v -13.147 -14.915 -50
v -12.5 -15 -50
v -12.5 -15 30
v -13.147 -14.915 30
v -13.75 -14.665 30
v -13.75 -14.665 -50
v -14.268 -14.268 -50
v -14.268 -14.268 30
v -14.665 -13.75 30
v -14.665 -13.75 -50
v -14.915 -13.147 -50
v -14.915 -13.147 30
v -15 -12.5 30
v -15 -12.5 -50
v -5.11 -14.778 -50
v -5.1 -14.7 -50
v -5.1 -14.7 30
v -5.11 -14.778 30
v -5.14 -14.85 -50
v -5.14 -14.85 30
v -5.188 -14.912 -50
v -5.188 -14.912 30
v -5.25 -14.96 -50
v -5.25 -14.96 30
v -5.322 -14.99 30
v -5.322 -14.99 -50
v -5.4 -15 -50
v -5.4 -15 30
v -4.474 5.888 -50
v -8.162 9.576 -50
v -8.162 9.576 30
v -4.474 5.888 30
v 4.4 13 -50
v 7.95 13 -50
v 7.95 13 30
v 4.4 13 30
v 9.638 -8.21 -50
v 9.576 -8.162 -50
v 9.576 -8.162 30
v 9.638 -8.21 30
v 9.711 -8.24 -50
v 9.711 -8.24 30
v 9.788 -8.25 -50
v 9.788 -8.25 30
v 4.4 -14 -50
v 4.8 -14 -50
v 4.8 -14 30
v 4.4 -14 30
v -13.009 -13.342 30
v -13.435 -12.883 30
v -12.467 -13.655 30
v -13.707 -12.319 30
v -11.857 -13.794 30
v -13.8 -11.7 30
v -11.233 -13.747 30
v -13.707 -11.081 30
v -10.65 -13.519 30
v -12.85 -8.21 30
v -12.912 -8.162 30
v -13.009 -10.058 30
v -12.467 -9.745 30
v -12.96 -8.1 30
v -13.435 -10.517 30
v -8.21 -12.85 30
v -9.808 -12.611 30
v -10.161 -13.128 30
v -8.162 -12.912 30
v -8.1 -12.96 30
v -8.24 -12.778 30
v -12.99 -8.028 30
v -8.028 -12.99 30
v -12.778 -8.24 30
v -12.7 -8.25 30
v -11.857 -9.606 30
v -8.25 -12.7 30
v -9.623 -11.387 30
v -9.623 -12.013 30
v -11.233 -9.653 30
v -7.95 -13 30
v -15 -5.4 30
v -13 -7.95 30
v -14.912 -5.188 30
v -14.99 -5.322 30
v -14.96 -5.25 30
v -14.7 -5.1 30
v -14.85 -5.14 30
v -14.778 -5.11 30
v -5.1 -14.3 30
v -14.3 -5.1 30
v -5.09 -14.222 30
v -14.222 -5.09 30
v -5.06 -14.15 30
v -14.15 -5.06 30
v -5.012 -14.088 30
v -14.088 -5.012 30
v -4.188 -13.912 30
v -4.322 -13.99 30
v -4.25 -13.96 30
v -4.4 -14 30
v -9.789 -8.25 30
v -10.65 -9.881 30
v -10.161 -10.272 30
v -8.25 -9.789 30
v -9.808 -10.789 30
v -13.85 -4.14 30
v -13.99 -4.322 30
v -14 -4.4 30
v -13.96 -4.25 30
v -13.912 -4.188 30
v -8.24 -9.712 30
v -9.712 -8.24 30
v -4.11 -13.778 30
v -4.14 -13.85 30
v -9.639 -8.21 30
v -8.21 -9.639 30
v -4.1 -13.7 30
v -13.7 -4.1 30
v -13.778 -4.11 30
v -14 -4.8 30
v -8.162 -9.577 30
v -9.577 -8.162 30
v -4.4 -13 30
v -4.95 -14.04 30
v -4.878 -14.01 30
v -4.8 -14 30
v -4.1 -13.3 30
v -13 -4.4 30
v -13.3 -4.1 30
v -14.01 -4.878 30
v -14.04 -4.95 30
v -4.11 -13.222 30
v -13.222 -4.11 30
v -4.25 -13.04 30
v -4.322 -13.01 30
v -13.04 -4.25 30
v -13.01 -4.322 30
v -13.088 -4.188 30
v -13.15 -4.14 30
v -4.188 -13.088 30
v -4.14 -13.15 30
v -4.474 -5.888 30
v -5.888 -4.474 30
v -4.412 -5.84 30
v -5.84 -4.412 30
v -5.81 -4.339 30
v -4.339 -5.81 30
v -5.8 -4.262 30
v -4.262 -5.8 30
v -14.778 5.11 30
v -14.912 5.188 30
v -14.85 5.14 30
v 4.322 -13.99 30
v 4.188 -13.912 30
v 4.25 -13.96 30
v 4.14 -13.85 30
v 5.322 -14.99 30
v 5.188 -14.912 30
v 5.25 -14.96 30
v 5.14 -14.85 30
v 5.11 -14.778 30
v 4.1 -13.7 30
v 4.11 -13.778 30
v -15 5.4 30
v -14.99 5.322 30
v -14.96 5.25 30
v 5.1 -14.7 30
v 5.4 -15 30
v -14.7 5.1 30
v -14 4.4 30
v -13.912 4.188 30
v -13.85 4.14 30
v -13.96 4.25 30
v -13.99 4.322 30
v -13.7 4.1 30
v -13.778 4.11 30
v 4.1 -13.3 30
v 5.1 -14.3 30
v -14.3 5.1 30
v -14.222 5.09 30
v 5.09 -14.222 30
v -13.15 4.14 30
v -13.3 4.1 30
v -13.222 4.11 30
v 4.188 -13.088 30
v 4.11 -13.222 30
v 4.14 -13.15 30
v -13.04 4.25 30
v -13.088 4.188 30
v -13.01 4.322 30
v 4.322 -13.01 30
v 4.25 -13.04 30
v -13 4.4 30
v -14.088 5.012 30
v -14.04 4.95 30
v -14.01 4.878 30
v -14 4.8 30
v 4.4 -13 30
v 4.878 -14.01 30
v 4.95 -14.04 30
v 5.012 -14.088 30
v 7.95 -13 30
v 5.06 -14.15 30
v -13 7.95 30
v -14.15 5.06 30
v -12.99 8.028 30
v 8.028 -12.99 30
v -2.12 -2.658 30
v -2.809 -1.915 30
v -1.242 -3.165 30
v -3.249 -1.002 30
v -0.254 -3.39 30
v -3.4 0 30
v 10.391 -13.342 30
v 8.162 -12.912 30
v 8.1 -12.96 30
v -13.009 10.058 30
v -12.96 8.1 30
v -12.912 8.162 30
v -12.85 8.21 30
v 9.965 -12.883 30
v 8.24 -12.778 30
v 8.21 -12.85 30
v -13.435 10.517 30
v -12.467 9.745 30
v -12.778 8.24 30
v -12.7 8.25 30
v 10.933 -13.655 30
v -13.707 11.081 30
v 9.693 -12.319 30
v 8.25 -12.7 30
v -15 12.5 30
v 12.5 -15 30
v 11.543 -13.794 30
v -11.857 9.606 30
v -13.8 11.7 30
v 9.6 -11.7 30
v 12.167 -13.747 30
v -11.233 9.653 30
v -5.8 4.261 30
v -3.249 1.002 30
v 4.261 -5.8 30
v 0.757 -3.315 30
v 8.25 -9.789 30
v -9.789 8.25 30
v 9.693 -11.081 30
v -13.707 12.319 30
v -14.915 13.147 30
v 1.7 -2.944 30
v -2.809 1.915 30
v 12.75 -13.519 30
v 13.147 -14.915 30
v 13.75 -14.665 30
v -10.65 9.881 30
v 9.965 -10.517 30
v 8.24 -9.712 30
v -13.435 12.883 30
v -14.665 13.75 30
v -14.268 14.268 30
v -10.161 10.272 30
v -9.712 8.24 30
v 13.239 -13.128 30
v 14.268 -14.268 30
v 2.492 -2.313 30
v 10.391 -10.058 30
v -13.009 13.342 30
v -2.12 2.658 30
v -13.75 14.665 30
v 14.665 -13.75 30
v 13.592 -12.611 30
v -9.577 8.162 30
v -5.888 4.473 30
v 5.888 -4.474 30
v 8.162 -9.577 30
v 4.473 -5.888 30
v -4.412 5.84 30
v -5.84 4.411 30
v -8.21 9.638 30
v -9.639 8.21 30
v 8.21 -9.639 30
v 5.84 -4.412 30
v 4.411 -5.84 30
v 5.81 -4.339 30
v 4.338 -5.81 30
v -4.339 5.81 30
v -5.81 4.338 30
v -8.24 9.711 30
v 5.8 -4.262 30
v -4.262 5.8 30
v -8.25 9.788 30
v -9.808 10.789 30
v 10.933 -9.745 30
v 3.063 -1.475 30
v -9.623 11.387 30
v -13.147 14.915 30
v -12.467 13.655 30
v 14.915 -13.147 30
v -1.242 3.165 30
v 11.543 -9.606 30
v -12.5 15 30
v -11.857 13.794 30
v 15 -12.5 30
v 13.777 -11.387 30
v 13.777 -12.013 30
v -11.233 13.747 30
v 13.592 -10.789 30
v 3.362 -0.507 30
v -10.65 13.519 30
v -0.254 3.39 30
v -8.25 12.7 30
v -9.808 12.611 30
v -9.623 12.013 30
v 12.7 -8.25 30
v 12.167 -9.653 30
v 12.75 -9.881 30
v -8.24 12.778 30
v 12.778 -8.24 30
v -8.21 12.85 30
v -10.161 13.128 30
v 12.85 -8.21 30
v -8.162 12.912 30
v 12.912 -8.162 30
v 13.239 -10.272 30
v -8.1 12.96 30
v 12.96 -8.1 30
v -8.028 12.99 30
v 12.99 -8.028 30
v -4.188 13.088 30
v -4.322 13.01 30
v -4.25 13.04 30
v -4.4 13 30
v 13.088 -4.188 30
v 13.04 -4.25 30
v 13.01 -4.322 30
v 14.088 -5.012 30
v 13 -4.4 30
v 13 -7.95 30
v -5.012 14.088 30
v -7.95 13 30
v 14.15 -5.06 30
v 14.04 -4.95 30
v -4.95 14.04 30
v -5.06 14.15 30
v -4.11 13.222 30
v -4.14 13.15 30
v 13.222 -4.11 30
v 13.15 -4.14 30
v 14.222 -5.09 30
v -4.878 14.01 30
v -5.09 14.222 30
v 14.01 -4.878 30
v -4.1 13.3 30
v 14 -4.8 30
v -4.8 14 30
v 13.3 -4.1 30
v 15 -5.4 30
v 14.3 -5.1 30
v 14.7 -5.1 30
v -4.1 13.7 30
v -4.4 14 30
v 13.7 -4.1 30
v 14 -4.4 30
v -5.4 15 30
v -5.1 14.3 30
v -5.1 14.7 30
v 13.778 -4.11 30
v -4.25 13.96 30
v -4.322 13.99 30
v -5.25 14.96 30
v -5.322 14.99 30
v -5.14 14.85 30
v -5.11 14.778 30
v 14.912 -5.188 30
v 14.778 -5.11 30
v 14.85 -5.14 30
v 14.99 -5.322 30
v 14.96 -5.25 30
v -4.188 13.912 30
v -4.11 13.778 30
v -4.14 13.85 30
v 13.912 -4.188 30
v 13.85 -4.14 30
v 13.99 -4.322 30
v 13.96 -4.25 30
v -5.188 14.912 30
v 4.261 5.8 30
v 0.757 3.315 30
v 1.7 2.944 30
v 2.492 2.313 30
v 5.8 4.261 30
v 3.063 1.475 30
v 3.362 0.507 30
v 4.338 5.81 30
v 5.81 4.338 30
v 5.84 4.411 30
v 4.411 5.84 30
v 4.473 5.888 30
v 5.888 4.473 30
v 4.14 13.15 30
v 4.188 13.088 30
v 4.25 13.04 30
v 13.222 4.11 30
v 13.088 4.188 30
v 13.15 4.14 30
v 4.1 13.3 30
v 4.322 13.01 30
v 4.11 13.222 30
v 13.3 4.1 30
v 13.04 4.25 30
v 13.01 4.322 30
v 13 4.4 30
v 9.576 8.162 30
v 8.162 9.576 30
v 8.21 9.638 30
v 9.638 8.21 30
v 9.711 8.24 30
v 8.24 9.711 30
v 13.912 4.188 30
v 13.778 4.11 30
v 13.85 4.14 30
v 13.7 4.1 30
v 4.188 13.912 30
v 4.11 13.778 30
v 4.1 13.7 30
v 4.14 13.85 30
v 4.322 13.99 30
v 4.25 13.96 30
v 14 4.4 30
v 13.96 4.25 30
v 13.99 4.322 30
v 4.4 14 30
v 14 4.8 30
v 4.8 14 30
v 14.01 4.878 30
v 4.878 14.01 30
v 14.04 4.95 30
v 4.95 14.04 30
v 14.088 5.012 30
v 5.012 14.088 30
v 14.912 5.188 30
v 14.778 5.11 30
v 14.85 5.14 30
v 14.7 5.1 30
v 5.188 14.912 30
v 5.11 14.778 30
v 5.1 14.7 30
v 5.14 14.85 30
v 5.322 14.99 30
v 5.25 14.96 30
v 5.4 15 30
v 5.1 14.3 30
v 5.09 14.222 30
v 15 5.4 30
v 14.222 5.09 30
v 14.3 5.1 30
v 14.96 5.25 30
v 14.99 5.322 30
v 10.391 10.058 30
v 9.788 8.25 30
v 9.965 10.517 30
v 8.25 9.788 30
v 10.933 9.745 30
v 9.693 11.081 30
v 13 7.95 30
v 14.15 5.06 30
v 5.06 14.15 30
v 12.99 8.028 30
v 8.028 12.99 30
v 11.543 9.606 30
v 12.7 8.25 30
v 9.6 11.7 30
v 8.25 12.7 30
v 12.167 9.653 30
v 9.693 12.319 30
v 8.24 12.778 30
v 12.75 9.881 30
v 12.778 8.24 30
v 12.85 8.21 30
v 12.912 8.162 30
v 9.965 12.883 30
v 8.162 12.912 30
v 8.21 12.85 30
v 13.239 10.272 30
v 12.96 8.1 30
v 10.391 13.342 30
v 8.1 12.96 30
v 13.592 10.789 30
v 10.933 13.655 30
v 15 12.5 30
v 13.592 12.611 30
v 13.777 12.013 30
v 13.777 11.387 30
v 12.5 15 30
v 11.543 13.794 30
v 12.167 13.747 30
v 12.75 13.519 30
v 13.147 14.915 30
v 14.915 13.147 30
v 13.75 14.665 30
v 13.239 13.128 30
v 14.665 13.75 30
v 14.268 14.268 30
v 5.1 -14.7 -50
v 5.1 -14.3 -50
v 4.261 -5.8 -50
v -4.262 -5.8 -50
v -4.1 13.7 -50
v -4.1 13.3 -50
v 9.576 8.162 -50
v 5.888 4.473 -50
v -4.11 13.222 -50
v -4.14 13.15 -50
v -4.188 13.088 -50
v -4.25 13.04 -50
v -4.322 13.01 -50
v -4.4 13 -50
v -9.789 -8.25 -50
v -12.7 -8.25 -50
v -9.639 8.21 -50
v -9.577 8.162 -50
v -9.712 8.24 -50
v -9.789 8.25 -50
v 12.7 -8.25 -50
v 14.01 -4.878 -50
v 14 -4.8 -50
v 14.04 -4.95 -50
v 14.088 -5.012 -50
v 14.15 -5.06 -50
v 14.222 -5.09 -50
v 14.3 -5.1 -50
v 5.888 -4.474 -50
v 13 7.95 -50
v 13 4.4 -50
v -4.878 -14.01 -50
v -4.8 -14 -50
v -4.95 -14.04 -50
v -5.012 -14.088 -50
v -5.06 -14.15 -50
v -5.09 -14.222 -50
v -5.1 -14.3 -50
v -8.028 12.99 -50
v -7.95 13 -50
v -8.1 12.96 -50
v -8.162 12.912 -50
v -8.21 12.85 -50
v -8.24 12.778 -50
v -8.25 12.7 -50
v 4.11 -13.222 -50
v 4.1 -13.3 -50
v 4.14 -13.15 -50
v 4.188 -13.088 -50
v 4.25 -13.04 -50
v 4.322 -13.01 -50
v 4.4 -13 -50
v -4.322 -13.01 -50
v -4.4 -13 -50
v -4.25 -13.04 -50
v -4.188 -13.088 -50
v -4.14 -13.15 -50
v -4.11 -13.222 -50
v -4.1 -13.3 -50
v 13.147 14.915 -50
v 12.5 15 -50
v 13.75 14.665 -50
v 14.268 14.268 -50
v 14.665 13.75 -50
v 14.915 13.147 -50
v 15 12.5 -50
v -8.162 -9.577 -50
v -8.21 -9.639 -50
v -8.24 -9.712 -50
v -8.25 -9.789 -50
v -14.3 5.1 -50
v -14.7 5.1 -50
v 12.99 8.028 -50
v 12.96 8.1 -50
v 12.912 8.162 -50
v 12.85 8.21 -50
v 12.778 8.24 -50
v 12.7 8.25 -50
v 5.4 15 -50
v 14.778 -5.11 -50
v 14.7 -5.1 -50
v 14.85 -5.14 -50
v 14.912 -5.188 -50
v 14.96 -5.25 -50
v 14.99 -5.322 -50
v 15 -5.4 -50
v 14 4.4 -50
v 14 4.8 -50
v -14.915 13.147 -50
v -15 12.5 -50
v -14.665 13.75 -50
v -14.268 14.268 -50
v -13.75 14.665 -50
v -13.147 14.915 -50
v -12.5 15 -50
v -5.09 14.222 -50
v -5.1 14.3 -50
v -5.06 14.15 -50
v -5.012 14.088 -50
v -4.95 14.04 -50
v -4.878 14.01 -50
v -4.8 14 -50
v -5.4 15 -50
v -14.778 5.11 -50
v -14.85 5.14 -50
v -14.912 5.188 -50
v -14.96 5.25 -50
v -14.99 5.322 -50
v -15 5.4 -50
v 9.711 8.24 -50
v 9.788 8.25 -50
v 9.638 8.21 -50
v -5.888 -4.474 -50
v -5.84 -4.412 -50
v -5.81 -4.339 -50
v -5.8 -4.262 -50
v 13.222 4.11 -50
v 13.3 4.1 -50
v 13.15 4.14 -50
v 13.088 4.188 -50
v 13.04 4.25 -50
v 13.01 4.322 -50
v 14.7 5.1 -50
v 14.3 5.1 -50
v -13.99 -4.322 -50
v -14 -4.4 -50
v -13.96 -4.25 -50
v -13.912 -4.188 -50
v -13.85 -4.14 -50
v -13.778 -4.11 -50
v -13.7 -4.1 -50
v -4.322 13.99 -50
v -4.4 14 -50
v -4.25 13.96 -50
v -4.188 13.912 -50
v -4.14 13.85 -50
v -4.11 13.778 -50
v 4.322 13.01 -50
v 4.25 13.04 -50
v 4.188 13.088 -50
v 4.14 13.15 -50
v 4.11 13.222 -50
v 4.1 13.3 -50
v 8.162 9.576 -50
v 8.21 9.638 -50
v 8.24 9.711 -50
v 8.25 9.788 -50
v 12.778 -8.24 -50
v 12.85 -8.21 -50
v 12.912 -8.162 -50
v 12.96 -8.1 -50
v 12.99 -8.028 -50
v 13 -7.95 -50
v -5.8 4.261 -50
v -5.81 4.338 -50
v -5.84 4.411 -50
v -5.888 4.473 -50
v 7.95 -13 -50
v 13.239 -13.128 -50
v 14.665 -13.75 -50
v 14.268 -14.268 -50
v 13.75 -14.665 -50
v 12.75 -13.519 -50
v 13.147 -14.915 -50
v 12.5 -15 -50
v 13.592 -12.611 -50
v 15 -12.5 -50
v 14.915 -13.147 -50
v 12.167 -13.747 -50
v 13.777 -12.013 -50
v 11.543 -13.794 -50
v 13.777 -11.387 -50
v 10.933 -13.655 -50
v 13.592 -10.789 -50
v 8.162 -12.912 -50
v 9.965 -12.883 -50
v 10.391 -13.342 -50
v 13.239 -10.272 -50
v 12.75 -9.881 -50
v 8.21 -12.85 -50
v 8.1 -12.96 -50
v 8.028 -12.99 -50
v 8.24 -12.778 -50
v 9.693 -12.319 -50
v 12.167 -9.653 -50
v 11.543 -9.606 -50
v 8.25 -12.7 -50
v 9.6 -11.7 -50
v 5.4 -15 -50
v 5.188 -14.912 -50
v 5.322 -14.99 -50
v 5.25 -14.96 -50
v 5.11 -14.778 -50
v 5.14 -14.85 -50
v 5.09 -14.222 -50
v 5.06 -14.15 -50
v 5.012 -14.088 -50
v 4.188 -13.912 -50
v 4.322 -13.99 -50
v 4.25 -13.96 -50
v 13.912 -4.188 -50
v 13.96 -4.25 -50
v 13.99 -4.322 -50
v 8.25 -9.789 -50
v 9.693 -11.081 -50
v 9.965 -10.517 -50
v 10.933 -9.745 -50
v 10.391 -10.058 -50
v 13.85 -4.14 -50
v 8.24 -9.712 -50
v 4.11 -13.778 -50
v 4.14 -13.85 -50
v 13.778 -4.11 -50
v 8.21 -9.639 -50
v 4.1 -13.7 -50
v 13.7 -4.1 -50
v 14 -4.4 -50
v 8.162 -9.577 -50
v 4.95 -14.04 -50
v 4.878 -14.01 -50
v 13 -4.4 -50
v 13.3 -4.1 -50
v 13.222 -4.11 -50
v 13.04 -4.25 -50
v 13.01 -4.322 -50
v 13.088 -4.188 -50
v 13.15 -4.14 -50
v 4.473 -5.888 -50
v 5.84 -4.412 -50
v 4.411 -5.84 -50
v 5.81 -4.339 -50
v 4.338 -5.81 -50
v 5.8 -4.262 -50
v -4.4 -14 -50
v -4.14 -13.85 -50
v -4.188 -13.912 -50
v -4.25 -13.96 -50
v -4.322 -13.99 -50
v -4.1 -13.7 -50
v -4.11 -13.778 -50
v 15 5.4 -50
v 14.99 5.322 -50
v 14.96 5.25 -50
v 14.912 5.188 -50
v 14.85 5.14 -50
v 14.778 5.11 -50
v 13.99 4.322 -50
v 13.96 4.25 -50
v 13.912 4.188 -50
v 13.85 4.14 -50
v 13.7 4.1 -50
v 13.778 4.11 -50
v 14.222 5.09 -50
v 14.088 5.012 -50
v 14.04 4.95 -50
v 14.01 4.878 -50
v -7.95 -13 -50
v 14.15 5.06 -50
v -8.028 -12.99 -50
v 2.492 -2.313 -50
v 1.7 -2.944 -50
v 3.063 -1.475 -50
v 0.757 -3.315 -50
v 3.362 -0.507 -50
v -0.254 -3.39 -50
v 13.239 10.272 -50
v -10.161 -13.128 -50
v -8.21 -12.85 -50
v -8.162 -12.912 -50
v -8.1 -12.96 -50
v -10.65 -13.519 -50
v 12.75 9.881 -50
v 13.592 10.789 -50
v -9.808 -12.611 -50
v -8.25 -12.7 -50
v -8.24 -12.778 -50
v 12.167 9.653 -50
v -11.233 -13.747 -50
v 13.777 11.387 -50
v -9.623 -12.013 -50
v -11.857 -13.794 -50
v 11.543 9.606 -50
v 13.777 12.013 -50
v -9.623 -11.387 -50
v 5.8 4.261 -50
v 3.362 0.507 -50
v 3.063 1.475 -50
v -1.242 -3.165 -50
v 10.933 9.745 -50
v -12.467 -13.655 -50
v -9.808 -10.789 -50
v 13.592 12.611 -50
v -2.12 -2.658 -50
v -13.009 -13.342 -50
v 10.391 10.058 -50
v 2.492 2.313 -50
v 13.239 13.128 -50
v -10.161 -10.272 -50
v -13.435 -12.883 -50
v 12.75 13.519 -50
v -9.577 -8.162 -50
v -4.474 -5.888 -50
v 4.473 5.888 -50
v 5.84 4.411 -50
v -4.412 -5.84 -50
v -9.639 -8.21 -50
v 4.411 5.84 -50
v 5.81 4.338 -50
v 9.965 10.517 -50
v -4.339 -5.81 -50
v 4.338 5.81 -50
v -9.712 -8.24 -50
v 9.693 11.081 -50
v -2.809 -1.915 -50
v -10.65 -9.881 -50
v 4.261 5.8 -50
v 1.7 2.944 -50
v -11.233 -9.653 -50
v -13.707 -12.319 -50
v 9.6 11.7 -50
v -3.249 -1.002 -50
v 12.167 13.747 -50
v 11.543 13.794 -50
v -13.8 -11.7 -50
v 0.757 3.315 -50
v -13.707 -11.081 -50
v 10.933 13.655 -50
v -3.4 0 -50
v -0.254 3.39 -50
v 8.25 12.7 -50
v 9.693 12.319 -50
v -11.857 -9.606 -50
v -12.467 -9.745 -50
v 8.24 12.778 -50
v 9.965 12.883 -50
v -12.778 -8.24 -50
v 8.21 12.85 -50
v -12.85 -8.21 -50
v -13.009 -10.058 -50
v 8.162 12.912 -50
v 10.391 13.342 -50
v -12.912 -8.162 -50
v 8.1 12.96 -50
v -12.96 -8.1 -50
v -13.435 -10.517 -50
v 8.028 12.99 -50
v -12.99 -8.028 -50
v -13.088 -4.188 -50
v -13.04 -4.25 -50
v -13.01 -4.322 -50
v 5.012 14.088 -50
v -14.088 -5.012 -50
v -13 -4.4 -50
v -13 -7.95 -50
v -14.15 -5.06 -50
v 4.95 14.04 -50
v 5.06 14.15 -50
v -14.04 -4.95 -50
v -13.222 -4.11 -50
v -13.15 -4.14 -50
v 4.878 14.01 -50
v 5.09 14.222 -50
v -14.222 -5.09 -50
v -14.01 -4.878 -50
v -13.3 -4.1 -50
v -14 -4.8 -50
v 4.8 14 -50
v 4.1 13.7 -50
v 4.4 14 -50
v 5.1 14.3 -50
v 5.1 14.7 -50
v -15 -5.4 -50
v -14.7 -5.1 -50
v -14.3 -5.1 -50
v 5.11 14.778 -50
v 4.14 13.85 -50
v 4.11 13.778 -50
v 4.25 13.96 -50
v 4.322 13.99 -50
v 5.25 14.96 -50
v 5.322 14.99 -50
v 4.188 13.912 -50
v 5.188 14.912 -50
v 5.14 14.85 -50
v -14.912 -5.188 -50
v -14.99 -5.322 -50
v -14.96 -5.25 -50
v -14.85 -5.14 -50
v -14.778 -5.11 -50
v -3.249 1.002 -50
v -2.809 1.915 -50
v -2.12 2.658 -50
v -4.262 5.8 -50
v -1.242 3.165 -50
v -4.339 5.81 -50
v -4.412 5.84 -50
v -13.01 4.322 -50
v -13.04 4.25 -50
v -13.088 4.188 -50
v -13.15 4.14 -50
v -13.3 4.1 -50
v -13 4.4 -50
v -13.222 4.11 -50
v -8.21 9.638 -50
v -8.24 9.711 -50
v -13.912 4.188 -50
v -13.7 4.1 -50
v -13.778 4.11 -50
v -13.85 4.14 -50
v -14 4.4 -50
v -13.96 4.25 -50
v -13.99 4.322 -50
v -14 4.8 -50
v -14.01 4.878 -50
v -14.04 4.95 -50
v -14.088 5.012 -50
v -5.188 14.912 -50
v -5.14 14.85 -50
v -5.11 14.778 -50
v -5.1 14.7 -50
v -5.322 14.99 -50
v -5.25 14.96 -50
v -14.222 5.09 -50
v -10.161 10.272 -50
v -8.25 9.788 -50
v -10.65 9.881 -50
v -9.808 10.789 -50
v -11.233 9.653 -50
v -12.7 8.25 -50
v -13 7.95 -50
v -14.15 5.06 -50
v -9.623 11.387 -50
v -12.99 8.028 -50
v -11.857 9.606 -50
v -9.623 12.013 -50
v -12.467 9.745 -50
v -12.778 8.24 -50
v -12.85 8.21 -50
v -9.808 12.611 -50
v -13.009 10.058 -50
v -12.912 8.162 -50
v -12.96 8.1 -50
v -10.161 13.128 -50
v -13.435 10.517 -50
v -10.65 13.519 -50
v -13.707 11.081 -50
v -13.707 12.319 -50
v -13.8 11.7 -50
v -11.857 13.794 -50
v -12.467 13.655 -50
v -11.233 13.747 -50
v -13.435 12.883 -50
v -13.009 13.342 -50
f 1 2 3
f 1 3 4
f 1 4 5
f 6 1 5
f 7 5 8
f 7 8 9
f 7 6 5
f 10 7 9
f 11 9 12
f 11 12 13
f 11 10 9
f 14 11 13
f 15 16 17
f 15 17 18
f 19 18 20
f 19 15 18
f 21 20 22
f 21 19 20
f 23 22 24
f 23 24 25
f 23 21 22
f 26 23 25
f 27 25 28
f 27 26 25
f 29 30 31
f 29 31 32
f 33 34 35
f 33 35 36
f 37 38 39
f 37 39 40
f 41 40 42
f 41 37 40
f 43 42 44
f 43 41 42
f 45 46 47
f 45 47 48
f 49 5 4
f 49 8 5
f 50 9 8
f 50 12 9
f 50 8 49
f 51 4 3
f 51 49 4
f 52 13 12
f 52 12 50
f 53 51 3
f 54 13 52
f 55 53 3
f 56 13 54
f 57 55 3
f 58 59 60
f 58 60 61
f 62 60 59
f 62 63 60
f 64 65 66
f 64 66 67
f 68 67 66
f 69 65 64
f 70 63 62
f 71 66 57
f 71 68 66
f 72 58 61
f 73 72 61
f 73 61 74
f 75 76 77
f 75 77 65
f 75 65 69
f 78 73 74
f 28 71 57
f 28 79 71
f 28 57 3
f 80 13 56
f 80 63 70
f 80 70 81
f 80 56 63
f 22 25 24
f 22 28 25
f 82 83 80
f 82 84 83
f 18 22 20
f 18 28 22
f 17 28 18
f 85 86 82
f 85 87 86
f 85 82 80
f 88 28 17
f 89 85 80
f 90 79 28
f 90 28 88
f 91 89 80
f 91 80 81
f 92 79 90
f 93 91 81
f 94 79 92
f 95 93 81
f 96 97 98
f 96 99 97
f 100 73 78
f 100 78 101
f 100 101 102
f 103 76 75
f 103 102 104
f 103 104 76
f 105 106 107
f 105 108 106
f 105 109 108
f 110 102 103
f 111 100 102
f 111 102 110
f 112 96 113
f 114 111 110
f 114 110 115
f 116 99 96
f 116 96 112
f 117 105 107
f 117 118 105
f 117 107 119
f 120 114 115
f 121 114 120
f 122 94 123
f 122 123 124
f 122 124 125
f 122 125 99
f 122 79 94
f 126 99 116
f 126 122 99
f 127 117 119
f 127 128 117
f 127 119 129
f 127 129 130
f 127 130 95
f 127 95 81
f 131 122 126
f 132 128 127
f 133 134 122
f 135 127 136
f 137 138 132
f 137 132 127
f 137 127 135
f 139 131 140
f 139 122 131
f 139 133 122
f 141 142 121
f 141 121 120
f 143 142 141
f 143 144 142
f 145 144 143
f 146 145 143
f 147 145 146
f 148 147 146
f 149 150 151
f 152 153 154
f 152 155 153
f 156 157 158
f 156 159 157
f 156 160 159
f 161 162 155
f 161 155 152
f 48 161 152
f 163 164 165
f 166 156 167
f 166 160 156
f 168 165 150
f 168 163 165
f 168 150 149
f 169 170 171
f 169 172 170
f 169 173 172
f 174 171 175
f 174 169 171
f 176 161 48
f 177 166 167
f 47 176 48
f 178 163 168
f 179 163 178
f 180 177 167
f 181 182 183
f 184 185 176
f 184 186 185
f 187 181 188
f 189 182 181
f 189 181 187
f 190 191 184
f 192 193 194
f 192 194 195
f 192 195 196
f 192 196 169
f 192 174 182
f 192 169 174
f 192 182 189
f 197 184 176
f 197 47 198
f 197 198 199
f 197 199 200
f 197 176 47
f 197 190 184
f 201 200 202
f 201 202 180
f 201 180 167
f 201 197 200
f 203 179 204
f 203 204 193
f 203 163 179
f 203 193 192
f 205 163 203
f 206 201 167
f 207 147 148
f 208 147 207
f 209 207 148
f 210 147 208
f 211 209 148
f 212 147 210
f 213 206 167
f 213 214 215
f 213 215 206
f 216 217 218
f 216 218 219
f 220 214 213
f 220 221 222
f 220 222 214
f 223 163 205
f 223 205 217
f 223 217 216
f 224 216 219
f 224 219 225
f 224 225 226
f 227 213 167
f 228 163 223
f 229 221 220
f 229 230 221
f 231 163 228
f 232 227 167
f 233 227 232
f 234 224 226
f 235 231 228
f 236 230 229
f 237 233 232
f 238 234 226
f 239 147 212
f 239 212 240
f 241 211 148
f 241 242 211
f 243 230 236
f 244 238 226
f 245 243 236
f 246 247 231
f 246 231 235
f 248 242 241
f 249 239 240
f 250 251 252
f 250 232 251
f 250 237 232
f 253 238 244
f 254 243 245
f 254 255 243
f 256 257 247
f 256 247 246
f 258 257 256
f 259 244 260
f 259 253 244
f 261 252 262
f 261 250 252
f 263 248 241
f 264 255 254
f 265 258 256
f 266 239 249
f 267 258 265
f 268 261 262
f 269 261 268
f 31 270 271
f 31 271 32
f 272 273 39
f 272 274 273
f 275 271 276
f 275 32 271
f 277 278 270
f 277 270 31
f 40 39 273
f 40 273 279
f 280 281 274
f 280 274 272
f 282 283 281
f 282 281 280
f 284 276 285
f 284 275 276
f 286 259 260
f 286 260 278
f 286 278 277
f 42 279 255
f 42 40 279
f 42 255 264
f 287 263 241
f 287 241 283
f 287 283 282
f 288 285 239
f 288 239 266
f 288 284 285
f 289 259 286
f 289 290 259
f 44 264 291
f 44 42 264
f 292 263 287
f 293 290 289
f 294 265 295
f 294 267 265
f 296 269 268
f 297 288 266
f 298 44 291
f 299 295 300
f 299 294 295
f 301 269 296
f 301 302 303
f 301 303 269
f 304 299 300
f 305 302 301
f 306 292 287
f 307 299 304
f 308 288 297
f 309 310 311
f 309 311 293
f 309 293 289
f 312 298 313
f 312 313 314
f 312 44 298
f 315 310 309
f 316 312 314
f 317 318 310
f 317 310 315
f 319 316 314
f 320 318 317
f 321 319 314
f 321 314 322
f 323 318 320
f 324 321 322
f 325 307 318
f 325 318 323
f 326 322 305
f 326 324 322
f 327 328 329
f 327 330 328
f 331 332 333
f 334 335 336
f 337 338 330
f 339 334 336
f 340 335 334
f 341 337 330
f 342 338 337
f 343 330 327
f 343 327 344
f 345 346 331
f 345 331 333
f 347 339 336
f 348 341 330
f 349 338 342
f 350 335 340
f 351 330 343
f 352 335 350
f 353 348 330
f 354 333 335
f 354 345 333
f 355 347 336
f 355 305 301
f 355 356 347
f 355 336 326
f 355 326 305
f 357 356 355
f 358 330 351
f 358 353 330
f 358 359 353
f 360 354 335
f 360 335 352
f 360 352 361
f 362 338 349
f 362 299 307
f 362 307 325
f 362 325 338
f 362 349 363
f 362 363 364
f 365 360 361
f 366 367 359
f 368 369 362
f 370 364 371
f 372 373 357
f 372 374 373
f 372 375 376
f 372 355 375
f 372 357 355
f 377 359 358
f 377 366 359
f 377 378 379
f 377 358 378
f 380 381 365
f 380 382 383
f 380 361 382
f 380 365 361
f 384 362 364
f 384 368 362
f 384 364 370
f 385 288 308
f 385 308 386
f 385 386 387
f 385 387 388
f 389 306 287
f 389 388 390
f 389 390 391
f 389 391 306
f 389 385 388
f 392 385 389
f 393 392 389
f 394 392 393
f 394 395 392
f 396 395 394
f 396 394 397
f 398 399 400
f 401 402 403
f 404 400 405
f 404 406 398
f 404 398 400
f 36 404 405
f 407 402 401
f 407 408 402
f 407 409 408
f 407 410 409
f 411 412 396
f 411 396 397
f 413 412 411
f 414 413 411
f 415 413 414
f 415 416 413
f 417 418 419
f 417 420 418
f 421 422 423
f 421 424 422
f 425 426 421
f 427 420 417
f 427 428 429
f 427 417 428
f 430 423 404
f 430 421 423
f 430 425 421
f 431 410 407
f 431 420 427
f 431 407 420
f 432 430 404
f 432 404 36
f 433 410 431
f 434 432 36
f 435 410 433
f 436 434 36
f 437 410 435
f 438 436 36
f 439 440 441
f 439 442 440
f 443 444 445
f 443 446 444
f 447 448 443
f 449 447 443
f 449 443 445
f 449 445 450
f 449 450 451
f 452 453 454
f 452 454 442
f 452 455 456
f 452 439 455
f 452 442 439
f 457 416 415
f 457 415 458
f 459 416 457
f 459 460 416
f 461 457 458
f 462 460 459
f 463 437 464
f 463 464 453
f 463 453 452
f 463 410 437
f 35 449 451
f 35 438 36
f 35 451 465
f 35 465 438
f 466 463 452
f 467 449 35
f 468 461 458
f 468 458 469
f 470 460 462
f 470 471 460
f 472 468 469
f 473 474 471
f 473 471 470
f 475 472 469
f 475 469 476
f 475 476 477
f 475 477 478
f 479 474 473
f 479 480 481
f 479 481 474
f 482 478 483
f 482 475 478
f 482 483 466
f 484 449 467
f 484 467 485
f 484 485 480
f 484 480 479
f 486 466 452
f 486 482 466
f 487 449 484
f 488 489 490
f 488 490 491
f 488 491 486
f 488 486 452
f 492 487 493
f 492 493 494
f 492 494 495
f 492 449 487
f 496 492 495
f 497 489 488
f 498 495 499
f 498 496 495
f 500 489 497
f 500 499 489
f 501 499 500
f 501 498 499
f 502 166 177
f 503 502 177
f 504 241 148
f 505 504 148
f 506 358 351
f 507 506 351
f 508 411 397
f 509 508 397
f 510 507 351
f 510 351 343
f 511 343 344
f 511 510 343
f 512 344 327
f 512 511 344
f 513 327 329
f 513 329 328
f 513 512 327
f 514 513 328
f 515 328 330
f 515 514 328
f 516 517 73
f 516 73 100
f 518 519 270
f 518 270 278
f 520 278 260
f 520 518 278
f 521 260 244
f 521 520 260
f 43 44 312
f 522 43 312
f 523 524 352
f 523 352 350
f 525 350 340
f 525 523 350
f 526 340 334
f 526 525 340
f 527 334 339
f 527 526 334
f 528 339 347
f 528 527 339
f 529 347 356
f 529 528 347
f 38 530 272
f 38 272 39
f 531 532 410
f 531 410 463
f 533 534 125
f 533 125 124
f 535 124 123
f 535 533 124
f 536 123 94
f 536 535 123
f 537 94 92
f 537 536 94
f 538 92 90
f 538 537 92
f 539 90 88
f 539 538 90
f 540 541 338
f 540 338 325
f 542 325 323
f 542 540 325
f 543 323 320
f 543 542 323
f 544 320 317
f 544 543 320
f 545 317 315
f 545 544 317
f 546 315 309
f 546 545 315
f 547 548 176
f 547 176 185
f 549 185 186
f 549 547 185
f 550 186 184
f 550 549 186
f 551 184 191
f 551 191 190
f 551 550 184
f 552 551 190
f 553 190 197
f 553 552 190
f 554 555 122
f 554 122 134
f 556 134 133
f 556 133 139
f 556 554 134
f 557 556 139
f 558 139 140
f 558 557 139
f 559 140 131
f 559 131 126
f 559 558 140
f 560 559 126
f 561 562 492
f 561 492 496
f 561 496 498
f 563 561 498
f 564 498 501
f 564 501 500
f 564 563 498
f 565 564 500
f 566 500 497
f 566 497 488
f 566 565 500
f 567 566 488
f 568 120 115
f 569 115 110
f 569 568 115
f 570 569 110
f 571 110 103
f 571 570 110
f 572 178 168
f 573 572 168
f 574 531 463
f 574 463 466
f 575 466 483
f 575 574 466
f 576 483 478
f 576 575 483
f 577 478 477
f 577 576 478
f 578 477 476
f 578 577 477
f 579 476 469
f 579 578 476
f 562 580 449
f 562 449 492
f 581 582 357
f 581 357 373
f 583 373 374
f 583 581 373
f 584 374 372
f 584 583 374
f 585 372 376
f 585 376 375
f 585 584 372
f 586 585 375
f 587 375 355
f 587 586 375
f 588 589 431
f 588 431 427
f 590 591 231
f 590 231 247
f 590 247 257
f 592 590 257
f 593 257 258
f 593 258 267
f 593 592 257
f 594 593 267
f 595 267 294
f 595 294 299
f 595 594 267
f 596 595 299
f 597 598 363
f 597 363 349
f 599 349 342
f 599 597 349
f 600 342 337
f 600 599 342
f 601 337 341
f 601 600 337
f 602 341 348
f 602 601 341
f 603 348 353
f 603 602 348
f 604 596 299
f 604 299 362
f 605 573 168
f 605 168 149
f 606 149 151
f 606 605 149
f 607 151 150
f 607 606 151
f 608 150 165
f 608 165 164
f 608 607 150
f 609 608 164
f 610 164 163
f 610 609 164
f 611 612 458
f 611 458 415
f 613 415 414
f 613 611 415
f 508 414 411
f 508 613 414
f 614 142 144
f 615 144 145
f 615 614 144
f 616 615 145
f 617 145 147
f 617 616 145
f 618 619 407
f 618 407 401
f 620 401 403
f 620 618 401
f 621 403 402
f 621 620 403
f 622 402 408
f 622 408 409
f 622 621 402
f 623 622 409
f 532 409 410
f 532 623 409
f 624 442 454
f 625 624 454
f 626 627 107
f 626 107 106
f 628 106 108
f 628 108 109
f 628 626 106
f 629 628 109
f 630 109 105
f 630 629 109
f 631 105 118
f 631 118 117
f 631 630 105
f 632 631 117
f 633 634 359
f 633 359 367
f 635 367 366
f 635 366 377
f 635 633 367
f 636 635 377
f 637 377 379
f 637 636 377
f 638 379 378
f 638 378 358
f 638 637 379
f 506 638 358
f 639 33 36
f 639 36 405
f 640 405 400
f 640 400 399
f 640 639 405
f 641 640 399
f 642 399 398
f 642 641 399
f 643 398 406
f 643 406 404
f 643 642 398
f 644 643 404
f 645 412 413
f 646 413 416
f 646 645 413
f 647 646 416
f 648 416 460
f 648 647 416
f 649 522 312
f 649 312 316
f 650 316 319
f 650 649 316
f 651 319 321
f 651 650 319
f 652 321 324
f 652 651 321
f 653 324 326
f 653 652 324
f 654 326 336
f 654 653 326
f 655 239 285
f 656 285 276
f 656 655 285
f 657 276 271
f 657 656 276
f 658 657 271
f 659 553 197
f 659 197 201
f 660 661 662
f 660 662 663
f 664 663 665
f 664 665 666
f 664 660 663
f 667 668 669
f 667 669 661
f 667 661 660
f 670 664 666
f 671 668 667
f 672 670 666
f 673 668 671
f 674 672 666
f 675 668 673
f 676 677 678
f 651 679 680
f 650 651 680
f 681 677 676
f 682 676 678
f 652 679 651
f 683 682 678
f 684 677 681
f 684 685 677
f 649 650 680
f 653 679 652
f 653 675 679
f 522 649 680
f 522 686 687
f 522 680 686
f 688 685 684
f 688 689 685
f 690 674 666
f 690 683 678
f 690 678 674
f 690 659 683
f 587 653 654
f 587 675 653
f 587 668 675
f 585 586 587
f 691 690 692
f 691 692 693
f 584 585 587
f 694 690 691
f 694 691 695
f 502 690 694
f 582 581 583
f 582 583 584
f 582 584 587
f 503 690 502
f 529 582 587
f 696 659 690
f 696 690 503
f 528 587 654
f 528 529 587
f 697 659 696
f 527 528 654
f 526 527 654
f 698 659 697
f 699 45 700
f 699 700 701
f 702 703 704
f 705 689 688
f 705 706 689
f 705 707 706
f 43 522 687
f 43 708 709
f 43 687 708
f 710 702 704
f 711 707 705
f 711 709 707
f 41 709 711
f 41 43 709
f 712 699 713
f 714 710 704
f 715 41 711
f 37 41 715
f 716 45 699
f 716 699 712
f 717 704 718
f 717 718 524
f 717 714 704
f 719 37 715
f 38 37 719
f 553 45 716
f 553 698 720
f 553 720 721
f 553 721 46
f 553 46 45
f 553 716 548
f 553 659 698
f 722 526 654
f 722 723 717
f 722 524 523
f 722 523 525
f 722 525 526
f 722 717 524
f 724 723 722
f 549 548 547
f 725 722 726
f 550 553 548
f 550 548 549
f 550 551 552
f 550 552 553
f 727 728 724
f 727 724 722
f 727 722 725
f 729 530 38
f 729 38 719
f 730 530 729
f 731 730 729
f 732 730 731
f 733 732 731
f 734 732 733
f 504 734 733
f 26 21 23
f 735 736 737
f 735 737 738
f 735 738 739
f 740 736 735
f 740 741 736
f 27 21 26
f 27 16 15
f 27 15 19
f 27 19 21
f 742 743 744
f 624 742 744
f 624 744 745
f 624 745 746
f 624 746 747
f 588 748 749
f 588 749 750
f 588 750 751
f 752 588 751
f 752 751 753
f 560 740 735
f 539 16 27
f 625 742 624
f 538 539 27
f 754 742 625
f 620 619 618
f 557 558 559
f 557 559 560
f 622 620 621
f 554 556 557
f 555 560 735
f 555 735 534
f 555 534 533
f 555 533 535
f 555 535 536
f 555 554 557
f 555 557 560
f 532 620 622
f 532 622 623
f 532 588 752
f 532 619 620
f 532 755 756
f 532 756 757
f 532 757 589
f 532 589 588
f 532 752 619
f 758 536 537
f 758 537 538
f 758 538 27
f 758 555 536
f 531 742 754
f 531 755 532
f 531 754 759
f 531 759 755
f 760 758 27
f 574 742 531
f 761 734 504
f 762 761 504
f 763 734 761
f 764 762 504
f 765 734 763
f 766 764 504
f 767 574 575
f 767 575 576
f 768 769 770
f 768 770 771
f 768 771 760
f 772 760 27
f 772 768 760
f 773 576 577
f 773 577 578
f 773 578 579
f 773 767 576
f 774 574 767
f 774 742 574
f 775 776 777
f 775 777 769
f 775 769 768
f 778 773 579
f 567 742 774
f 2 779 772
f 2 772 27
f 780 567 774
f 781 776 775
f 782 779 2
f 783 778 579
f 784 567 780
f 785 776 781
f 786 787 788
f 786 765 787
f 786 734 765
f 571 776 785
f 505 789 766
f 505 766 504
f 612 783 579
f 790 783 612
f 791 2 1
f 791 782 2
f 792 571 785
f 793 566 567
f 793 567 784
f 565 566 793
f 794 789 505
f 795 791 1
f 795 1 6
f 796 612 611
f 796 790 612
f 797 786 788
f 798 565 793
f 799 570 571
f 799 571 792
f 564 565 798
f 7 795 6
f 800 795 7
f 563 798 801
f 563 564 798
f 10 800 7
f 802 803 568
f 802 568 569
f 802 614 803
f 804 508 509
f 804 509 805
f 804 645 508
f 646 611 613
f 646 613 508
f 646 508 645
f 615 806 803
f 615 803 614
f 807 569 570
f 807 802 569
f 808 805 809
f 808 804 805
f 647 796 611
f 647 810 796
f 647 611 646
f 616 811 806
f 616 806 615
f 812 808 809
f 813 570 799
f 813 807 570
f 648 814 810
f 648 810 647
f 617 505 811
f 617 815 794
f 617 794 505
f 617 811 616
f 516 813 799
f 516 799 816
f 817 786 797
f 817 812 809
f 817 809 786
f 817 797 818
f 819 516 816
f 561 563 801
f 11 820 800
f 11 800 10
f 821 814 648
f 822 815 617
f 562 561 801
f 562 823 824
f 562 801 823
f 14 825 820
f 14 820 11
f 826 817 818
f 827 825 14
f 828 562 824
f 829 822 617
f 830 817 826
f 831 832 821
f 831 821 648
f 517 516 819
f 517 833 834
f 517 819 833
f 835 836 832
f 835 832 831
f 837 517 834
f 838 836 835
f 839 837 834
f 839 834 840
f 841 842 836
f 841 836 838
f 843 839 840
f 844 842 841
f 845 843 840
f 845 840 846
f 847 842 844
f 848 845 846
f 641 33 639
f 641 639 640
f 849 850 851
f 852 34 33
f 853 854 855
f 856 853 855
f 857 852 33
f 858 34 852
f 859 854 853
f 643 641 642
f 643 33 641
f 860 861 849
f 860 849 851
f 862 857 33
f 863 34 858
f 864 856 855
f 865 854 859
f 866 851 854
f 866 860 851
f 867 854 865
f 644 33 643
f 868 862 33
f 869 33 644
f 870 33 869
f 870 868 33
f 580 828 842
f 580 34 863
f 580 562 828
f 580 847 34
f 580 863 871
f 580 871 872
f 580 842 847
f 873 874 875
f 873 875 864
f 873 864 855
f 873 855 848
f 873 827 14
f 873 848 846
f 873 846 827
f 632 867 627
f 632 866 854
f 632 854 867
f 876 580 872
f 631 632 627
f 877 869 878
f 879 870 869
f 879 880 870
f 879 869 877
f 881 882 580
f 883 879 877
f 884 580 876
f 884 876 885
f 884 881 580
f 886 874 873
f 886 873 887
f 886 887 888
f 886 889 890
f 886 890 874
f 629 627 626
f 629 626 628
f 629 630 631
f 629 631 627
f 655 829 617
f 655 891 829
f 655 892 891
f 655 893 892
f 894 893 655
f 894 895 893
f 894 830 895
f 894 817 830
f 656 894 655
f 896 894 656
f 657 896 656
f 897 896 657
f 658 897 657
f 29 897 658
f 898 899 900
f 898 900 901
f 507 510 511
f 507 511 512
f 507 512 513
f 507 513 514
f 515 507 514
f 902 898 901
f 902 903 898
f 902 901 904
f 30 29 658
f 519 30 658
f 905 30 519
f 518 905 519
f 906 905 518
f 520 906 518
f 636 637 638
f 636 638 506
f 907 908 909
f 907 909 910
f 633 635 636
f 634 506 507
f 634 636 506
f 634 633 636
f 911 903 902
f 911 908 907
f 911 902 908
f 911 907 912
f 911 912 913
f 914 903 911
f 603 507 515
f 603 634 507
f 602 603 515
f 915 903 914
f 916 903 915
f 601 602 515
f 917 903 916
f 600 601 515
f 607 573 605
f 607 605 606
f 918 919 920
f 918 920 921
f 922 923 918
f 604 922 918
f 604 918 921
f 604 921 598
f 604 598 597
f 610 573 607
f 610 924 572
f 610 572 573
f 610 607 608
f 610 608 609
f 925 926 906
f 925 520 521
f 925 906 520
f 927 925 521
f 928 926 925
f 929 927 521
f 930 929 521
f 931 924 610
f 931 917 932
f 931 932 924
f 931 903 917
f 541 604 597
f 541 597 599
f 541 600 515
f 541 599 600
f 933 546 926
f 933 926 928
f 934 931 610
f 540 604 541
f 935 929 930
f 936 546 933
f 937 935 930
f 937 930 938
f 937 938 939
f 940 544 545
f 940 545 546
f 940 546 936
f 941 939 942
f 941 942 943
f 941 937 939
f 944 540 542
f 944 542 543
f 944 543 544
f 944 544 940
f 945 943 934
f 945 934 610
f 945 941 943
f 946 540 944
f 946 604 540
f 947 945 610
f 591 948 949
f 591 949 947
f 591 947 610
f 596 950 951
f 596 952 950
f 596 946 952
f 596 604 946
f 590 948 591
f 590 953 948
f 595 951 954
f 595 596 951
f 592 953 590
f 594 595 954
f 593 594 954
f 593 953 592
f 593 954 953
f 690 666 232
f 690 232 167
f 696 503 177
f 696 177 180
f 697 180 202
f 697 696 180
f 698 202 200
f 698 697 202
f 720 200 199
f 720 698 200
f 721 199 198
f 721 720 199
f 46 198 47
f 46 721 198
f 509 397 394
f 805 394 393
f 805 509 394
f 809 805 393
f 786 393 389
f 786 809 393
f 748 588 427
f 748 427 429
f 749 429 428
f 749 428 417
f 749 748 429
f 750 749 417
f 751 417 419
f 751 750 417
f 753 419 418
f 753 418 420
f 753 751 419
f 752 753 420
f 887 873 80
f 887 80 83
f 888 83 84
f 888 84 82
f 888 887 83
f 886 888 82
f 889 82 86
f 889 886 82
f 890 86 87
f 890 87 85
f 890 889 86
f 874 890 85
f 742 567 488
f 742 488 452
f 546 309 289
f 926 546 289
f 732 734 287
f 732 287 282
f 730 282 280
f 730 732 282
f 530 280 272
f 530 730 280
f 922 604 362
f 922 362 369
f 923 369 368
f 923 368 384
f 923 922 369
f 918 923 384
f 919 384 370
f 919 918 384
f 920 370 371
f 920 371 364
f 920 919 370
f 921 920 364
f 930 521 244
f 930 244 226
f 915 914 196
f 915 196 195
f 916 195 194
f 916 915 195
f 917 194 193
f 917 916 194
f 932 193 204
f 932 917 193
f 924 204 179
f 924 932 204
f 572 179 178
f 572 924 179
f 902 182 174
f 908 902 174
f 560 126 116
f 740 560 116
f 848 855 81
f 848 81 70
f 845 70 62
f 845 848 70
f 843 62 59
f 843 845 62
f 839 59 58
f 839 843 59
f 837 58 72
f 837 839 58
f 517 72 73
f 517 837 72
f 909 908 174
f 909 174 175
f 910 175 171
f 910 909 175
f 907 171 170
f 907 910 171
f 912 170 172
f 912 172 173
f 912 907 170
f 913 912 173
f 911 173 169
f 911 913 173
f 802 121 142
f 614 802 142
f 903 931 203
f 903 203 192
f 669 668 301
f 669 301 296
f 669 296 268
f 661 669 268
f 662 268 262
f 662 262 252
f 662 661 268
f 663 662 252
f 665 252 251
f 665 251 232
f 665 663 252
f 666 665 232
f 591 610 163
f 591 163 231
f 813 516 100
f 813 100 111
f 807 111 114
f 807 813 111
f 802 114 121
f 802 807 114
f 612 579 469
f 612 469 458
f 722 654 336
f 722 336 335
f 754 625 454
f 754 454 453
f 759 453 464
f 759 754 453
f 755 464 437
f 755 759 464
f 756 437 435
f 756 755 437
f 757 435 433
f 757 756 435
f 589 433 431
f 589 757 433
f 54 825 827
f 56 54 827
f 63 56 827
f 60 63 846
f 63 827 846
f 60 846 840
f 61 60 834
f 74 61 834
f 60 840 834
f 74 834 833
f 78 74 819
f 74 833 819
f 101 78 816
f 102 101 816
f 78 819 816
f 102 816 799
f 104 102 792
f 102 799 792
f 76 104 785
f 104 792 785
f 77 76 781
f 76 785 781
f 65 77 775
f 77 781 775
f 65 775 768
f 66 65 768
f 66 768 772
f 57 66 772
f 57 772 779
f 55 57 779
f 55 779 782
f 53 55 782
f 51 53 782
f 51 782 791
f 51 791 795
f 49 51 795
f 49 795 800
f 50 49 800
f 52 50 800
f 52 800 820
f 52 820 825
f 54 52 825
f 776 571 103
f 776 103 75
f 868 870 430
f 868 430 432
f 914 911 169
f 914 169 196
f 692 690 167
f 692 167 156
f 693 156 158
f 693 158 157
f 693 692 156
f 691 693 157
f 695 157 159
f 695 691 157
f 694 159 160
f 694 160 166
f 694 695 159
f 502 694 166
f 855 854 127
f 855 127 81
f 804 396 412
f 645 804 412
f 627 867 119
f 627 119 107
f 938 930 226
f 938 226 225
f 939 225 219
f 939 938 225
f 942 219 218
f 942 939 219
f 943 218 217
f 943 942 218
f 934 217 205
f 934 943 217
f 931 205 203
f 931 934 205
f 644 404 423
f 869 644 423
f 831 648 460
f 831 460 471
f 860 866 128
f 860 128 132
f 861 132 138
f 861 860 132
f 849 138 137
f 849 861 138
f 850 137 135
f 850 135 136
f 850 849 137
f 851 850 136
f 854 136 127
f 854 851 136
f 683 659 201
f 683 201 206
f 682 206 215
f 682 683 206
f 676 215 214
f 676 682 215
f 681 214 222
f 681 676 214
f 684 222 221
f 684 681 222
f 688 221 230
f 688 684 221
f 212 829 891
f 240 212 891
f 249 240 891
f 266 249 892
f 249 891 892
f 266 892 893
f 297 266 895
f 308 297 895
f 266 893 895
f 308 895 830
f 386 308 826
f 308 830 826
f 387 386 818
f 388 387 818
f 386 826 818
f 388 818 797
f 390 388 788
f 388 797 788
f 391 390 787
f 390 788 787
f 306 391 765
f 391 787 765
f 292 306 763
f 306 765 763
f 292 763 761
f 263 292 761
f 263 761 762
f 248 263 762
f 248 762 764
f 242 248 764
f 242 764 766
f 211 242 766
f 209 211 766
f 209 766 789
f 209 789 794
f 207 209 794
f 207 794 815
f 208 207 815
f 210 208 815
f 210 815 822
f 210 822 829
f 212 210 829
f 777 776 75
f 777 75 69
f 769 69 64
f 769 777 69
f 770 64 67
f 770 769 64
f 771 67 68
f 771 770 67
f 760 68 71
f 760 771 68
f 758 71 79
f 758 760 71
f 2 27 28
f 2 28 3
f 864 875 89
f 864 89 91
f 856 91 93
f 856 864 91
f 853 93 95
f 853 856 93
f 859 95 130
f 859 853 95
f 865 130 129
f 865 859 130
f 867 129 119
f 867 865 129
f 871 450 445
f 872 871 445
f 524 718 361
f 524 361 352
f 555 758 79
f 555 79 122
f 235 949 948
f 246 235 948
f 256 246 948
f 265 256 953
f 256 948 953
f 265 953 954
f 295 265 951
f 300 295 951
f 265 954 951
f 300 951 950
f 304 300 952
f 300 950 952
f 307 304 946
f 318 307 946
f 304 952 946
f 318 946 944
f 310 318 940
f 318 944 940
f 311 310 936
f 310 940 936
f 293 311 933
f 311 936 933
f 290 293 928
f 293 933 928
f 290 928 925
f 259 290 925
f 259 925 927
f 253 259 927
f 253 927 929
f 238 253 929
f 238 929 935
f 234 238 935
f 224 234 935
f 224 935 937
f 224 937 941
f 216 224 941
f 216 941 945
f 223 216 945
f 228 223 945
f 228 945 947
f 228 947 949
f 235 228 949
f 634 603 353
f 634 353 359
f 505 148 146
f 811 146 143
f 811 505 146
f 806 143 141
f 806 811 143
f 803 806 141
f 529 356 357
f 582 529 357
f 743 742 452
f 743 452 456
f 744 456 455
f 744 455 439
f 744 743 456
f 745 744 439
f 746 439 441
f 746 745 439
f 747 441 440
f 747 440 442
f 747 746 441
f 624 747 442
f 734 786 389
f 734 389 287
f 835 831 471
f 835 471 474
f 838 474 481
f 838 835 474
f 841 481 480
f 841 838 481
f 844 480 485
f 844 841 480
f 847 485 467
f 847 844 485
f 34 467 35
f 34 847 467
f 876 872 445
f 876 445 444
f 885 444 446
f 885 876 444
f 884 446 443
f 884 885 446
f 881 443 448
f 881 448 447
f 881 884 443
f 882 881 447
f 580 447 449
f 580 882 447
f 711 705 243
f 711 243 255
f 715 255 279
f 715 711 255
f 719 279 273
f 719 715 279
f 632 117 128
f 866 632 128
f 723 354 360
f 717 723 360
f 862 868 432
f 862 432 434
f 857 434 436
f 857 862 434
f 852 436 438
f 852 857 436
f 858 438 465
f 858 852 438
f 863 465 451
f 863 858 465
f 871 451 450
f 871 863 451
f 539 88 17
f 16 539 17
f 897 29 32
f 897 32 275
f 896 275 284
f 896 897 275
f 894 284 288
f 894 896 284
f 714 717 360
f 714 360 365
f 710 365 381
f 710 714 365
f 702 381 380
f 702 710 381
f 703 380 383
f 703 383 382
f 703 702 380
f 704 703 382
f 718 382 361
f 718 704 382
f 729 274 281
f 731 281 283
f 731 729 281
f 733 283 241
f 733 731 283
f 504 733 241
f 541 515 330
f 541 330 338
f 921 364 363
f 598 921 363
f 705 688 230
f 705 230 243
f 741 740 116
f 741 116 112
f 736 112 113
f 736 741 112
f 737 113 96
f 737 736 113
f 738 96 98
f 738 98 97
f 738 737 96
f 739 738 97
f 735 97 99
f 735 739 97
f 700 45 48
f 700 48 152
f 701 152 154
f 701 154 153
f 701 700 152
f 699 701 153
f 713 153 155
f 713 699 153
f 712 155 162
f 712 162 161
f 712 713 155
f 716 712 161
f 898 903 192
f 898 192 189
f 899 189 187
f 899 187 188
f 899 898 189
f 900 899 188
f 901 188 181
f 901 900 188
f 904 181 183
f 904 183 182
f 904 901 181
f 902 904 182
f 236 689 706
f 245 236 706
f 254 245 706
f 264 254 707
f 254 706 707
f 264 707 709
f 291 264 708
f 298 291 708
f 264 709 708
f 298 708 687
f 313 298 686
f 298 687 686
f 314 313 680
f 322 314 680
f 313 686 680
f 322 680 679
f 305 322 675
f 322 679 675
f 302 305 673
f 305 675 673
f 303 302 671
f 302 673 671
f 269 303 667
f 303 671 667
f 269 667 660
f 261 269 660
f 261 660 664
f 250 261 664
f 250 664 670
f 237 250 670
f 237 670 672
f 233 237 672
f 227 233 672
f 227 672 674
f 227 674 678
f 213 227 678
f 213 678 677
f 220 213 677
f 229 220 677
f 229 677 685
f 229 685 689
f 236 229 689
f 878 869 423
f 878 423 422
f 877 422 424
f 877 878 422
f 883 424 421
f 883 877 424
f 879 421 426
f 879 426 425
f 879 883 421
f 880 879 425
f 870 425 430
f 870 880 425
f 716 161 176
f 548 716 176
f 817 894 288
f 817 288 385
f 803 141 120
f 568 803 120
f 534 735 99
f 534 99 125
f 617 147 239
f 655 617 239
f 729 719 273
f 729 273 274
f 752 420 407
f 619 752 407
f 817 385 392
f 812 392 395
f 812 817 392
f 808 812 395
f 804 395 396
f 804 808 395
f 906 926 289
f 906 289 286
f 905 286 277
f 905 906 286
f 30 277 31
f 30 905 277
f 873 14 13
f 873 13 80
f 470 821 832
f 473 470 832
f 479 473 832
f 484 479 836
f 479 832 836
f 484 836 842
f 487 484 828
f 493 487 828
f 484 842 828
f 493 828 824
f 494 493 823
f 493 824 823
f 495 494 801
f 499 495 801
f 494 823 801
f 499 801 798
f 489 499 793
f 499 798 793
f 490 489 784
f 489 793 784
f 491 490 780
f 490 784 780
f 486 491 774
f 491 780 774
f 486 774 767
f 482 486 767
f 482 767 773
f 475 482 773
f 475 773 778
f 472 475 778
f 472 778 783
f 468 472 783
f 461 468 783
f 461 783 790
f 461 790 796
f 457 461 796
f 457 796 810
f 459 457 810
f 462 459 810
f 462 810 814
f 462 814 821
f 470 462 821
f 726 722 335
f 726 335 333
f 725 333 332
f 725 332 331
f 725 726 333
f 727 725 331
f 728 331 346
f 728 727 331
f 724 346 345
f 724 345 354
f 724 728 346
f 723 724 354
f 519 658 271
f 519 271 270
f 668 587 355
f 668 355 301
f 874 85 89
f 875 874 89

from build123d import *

# Parameters (mm, degrees)
CROQUIS1_R              = 2.1
CROQUIS1_R_2            = 3.4
SALIENTE_EXTRUIR1_DEPTH = 400
CROQUIS2_W              = 38.422022472
CROQUIS2_H              = 31.615605493
CORTAR_EXTRUIR1_DEPTH   = 320


with BuildPart() as part:
    # Croquis1 → Saliente-Extruir1 (new body)
    with BuildSketch(Plane(origin=(0, 0, -50), x_dir=(-1, 0, 0), z_dir=(0, 0, -1))):
        with BuildLine():
            Line((14.7, -5.1), (14.3, -5.1))
            ThreePointArc((14.3, -5.1), (14.087867966, -5.012132034), (14, -4.8))
            Line((14, -4.8), (14, -4.4))
            ThreePointArc((14, -4.4), (13.912132034, -4.187867966), (13.7, -4.1))
            Line((13.7, -4.1), (13.3, -4.1))
            ThreePointArc((13.3, -4.1), (13.087867966, -4.187867966), (13, -4.4))
            Line((13, -4.4), (13, -7.95))
            ThreePointArc((13, -7.95), (12.912132034, -8.162132034), (12.7, -8.25))
            Line((12.7, -8.25), (9.789264108, -8.25))
            ThreePointArc((9.789264108, -8.25), (9.674477865, -8.22717164), (9.577160832, -8.162160788))
            Line((9.577160832, -8.162160788), (5.887896723, -4.473896751))
            ThreePointArc((5.887896723, -4.473896751), (5.822843922, -4.376559778), (5.8, -4.261735963))
            Line((5.8, -4.261735963), (5.8, 4.260735931))
            ThreePointArc((5.8, 4.260735931), (5.82283614, 4.375540961), (5.887867966, 4.472867966))
            Line((5.887867966, 4.472867966), (9.577132034, 8.162132034))
            ThreePointArc((9.577132034, 8.162132034), (9.674459039, 8.22716386), (9.789264069, 8.25))
            Line((9.789264069, 8.25), (12.7, 8.25))
            ThreePointArc((12.7, 8.25), (12.912132034, 8.162132034), (13, 7.95))
            Line((13, 7.95), (13, 4.4))
            ThreePointArc((13, 4.4), (13.087867966, 4.187867966), (13.3, 4.1))
            Line((13.3, 4.1), (13.7, 4.1))
            ThreePointArc((13.7, 4.1), (13.912132034, 4.187867966), (14, 4.4))
            Line((14, 4.4), (14, 4.8))
            ThreePointArc((14, 4.8), (14.087867966, 5.012132034), (14.3, 5.1))
            Line((14.3, 5.1), (14.7, 5.1))
            ThreePointArc((14.7, 5.1), (14.912132034, 5.187867966), (15, 5.4))
            Line((15, 5.4), (15, 12.5))
            ThreePointArc((15, 12.5), (14.267766953, 14.267766953), (12.5, 15))
            Line((12.5, 15), (5.4, 15))
            ThreePointArc((5.4, 15), (5.187867966, 14.912132034), (5.1, 14.7))
            Line((5.1, 14.7), (5.1, 14.3))
            ThreePointArc((5.1, 14.3), (5.012132034, 14.087867966), (4.8, 14))
            Line((4.8, 14), (4.4, 14))
            ThreePointArc((4.4, 14), (4.187867966, 13.912132034), (4.1, 13.7))
            Line((4.1, 13.7), (4.1, 13.3))
            ThreePointArc((4.1, 13.3), (4.187867966, 13.087867966), (4.4, 13))
            Line((4.4, 13), (7.95, 13))
            ThreePointArc((7.95, 13), (8.162132034, 12.912132034), (8.25, 12.7))
            Line((8.25, 12.7), (8.25, 9.788264069))
            ThreePointArc((8.25, 9.788264069), (8.22716386, 9.673459039), (8.162132034, 9.576132034))
            Line((8.162132034, 9.576132034), (4.473867966, 5.887867966))
            ThreePointArc((4.473867966, 5.887867966), (4.376540961, 5.82283614), (4.261735931, 5.8))
            Line((4.261735931, 5.8), (-4.260735892, 5.8))
            ThreePointArc((-4.260735892, 5.8), (-4.375522135, 5.82282836), (-4.472839168, 5.887839212))
            Line((-4.472839168, 5.887839212), (-8.162103277, 9.576103249))
            ThreePointArc((-8.162103277, 9.576103249), (-8.227156078, 9.673440222), (-8.25, 9.788264037))
            Line((-8.25, 9.788264037), (-8.25, 12.7))
            ThreePointArc((-8.25, 12.7), (-8.162132034, 12.912132034), (-7.95, 13))
            Line((-7.95, 13), (-4.4, 13))
            ThreePointArc((-4.4, 13), (-4.187867966, 13.087867966), (-4.1, 13.3))
            Line((-4.1, 13.3), (-4.1, 13.7))
            ThreePointArc((-4.1, 13.7), (-4.187867966, 13.912132034), (-4.4, 14))
            Line((-4.4, 14), (-4.8, 14))
            ThreePointArc((-4.8, 14), (-5.012132034, 14.087867966), (-5.1, 14.3))
            Line((-5.1, 14.3), (-5.1, 14.7))
            ThreePointArc((-5.1, 14.7), (-5.187867966, 14.912132034), (-5.4, 15))
            Line((-5.4, 15), (-12.5, 15))
            ThreePointArc((-12.5, 15), (-14.267766953, 14.267766953), (-15, 12.5))
            Line((-15, 12.5), (-15, 5.4))
            ThreePointArc((-15, 5.4), (-14.912132034, 5.187867966), (-14.7, 5.1))
            Line((-14.7, 5.1), (-14.3, 5.1))
            ThreePointArc((-14.3, 5.1), (-14.087867966, 5.012132034), (-14, 4.8))
            Line((-14, 4.8), (-14, 4.4))
            ThreePointArc((-14, 4.4), (-13.912132034, 4.187867966), (-13.7, 4.1))
            Line((-13.7, 4.1), (-13.3, 4.1))
            ThreePointArc((-13.3, 4.1), (-13.087867966, 4.187867966), (-13, 4.4))
            Line((-13, 4.4), (-13, 7.95))
            ThreePointArc((-13, 7.95), (-12.912132034, 8.162132034), (-12.7, 8.25))
            Line((-12.7, 8.25), (-9.788264037, 8.25))
            ThreePointArc((-9.788264037, 8.25), (-9.673440222, 8.227156078), (-9.576103249, 8.162103277))
            Line((-9.576103249, 8.162103277), (-5.887839212, 4.472839168))
            ThreePointArc((-5.887839212, 4.472839168), (-5.82282836, 4.375522135), (-5.8, 4.260735892))
            Line((-5.8, 4.260735892), (-5.8, -4.261735931))
            ThreePointArc((-5.8, -4.261735931), (-5.82283614, -4.376540961), (-5.887867966, -4.473867966))
            Line((-5.887867966, -4.473867966), (-9.576132034, -8.162132034))
            ThreePointArc((-9.576132034, -8.162132034), (-9.673459039, -8.22716386), (-9.788264069, -8.25))
            Line((-9.788264069, -8.25), (-12.7, -8.25))
            ThreePointArc((-12.7, -8.25), (-12.912132034, -8.162132034), (-13, -7.95))
            Line((-13, -7.95), (-13, -4.4))
            ThreePointArc((-13, -4.4), (-13.087867966, -4.187867966), (-13.3, -4.1))
            Line((-13.3, -4.1), (-13.7, -4.1))
            ThreePointArc((-13.7, -4.1), (-13.912132034, -4.187867966), (-14, -4.4))
            Line((-14, -4.4), (-14, -4.8))
            ThreePointArc((-14, -4.8), (-14.087867966, -5.012132034), (-14.3, -5.1))
            Line((-14.3, -5.1), (-14.7, -5.1))
            ThreePointArc((-14.7, -5.1), (-14.912132034, -5.187867966), (-15, -5.4))
            Line((-15, -5.4), (-15, -12.5))
            ThreePointArc((-15, -12.5), (-14.267766953, -14.267766953), (-12.5, -15))
            Line((-12.5, -15), (-5.4, -15))
            ThreePointArc((-5.4, -15), (-5.187867966, -14.912132034), (-5.1, -14.7))
            Line((-5.1, -14.7), (-5.1, -14.3))
            ThreePointArc((-5.1, -14.3), (-5.012132034, -14.087867966), (-4.8, -14))
            Line((-4.8, -14), (-4.4, -14))
            ThreePointArc((-4.4, -14), (-4.187867966, -13.912132034), (-4.1, -13.7))
            Line((-4.1, -13.7), (-4.1, -13.3))
            ThreePointArc((-4.1, -13.3), (-4.187867966, -13.087867966), (-4.4, -13))
            Line((-4.4, -13), (-7.95, -13))
            ThreePointArc((-7.95, -13), (-8.162132034, -12.912132034), (-8.25, -12.7))
            Line((-8.25, -12.7), (-8.25, -9.789264069))
            ThreePointArc((-8.25, -9.789264069), (-8.22716386, -9.674459039), (-8.162132034, -9.577132034))
            Line((-8.162132034, -9.577132034), (-4.472867966, -5.887867966))
            ThreePointArc((-4.472867966, -5.887867966), (-4.375540961, -5.82283614), (-4.260735931, -5.8))
            Line((-4.260735931, -5.8), (4.261735963, -5.8))
            ThreePointArc((4.261735963, -5.8), (4.376559778, -5.822843922), (4.473896751, -5.887896723))
            Line((4.473896751, -5.887896723), (8.162160788, -9.577160832))
            ThreePointArc((8.162160788, -9.577160832), (8.22717164, -9.674477865), (8.25, -9.789264108))
            Line((8.25, -9.789264108), (8.25, -12.7))
            ThreePointArc((8.25, -12.7), (8.162132034, -12.912132034), (7.95, -13))
            Line((7.95, -13), (4.4, -13))
            ThreePointArc((4.4, -13), (4.187867966, -13.087867966), (4.1, -13.3))
            Line((4.1, -13.3), (4.1, -13.7))
            ThreePointArc((4.1, -13.7), (4.187867966, -13.912132034), (4.4, -14))
            Line((4.4, -14), (4.8, -14))
            ThreePointArc((4.8, -14), (5.012132034, -14.087867966), (5.1, -14.3))
            Line((5.1, -14.3), (5.1, -14.7))
            ThreePointArc((5.1, -14.7), (5.187867966, -14.912132034), (5.4, -15))
            Line((5.4, -15), (12.5, -15))
            ThreePointArc((12.5, -15), (14.267766953, -14.267766953), (15, -12.5))
            Line((15, -12.5), (15, -5.4))
            ThreePointArc((15, -5.4), (14.912132034, -5.187867966), (14.7, -5.1))
        make_face()
        with Locations((-11.7, 11.7)):
            Circle(CROQUIS1_R, mode=Mode.SUBTRACT)
        with Locations((-11.7, -11.7)):
            Circle(CROQUIS1_R, mode=Mode.SUBTRACT)
        Circle(CROQUIS1_R_2, mode=Mode.SUBTRACT)
        with Locations((11.7, 11.7)):
            Circle(CROQUIS1_R, mode=Mode.SUBTRACT)
        with Locations((11.7, -11.7)):
            Circle(CROQUIS1_R, mode=Mode.SUBTRACT)
    extrude(amount=-SALIENTE_EXTRUIR1_DEPTH)

    # Croquis2 → Cortar-Extruir1 (cut)
    with BuildSketch(Plane.XY.offset(350)):
        with Locations((1.308926342, 0.261785268)):
            Rectangle(CROQUIS2_W, CROQUIS2_H)
    extrude(amount=-CORTAR_EXTRUIR1_DEPTH, mode=Mode.SUBTRACT)


solid = part.part
